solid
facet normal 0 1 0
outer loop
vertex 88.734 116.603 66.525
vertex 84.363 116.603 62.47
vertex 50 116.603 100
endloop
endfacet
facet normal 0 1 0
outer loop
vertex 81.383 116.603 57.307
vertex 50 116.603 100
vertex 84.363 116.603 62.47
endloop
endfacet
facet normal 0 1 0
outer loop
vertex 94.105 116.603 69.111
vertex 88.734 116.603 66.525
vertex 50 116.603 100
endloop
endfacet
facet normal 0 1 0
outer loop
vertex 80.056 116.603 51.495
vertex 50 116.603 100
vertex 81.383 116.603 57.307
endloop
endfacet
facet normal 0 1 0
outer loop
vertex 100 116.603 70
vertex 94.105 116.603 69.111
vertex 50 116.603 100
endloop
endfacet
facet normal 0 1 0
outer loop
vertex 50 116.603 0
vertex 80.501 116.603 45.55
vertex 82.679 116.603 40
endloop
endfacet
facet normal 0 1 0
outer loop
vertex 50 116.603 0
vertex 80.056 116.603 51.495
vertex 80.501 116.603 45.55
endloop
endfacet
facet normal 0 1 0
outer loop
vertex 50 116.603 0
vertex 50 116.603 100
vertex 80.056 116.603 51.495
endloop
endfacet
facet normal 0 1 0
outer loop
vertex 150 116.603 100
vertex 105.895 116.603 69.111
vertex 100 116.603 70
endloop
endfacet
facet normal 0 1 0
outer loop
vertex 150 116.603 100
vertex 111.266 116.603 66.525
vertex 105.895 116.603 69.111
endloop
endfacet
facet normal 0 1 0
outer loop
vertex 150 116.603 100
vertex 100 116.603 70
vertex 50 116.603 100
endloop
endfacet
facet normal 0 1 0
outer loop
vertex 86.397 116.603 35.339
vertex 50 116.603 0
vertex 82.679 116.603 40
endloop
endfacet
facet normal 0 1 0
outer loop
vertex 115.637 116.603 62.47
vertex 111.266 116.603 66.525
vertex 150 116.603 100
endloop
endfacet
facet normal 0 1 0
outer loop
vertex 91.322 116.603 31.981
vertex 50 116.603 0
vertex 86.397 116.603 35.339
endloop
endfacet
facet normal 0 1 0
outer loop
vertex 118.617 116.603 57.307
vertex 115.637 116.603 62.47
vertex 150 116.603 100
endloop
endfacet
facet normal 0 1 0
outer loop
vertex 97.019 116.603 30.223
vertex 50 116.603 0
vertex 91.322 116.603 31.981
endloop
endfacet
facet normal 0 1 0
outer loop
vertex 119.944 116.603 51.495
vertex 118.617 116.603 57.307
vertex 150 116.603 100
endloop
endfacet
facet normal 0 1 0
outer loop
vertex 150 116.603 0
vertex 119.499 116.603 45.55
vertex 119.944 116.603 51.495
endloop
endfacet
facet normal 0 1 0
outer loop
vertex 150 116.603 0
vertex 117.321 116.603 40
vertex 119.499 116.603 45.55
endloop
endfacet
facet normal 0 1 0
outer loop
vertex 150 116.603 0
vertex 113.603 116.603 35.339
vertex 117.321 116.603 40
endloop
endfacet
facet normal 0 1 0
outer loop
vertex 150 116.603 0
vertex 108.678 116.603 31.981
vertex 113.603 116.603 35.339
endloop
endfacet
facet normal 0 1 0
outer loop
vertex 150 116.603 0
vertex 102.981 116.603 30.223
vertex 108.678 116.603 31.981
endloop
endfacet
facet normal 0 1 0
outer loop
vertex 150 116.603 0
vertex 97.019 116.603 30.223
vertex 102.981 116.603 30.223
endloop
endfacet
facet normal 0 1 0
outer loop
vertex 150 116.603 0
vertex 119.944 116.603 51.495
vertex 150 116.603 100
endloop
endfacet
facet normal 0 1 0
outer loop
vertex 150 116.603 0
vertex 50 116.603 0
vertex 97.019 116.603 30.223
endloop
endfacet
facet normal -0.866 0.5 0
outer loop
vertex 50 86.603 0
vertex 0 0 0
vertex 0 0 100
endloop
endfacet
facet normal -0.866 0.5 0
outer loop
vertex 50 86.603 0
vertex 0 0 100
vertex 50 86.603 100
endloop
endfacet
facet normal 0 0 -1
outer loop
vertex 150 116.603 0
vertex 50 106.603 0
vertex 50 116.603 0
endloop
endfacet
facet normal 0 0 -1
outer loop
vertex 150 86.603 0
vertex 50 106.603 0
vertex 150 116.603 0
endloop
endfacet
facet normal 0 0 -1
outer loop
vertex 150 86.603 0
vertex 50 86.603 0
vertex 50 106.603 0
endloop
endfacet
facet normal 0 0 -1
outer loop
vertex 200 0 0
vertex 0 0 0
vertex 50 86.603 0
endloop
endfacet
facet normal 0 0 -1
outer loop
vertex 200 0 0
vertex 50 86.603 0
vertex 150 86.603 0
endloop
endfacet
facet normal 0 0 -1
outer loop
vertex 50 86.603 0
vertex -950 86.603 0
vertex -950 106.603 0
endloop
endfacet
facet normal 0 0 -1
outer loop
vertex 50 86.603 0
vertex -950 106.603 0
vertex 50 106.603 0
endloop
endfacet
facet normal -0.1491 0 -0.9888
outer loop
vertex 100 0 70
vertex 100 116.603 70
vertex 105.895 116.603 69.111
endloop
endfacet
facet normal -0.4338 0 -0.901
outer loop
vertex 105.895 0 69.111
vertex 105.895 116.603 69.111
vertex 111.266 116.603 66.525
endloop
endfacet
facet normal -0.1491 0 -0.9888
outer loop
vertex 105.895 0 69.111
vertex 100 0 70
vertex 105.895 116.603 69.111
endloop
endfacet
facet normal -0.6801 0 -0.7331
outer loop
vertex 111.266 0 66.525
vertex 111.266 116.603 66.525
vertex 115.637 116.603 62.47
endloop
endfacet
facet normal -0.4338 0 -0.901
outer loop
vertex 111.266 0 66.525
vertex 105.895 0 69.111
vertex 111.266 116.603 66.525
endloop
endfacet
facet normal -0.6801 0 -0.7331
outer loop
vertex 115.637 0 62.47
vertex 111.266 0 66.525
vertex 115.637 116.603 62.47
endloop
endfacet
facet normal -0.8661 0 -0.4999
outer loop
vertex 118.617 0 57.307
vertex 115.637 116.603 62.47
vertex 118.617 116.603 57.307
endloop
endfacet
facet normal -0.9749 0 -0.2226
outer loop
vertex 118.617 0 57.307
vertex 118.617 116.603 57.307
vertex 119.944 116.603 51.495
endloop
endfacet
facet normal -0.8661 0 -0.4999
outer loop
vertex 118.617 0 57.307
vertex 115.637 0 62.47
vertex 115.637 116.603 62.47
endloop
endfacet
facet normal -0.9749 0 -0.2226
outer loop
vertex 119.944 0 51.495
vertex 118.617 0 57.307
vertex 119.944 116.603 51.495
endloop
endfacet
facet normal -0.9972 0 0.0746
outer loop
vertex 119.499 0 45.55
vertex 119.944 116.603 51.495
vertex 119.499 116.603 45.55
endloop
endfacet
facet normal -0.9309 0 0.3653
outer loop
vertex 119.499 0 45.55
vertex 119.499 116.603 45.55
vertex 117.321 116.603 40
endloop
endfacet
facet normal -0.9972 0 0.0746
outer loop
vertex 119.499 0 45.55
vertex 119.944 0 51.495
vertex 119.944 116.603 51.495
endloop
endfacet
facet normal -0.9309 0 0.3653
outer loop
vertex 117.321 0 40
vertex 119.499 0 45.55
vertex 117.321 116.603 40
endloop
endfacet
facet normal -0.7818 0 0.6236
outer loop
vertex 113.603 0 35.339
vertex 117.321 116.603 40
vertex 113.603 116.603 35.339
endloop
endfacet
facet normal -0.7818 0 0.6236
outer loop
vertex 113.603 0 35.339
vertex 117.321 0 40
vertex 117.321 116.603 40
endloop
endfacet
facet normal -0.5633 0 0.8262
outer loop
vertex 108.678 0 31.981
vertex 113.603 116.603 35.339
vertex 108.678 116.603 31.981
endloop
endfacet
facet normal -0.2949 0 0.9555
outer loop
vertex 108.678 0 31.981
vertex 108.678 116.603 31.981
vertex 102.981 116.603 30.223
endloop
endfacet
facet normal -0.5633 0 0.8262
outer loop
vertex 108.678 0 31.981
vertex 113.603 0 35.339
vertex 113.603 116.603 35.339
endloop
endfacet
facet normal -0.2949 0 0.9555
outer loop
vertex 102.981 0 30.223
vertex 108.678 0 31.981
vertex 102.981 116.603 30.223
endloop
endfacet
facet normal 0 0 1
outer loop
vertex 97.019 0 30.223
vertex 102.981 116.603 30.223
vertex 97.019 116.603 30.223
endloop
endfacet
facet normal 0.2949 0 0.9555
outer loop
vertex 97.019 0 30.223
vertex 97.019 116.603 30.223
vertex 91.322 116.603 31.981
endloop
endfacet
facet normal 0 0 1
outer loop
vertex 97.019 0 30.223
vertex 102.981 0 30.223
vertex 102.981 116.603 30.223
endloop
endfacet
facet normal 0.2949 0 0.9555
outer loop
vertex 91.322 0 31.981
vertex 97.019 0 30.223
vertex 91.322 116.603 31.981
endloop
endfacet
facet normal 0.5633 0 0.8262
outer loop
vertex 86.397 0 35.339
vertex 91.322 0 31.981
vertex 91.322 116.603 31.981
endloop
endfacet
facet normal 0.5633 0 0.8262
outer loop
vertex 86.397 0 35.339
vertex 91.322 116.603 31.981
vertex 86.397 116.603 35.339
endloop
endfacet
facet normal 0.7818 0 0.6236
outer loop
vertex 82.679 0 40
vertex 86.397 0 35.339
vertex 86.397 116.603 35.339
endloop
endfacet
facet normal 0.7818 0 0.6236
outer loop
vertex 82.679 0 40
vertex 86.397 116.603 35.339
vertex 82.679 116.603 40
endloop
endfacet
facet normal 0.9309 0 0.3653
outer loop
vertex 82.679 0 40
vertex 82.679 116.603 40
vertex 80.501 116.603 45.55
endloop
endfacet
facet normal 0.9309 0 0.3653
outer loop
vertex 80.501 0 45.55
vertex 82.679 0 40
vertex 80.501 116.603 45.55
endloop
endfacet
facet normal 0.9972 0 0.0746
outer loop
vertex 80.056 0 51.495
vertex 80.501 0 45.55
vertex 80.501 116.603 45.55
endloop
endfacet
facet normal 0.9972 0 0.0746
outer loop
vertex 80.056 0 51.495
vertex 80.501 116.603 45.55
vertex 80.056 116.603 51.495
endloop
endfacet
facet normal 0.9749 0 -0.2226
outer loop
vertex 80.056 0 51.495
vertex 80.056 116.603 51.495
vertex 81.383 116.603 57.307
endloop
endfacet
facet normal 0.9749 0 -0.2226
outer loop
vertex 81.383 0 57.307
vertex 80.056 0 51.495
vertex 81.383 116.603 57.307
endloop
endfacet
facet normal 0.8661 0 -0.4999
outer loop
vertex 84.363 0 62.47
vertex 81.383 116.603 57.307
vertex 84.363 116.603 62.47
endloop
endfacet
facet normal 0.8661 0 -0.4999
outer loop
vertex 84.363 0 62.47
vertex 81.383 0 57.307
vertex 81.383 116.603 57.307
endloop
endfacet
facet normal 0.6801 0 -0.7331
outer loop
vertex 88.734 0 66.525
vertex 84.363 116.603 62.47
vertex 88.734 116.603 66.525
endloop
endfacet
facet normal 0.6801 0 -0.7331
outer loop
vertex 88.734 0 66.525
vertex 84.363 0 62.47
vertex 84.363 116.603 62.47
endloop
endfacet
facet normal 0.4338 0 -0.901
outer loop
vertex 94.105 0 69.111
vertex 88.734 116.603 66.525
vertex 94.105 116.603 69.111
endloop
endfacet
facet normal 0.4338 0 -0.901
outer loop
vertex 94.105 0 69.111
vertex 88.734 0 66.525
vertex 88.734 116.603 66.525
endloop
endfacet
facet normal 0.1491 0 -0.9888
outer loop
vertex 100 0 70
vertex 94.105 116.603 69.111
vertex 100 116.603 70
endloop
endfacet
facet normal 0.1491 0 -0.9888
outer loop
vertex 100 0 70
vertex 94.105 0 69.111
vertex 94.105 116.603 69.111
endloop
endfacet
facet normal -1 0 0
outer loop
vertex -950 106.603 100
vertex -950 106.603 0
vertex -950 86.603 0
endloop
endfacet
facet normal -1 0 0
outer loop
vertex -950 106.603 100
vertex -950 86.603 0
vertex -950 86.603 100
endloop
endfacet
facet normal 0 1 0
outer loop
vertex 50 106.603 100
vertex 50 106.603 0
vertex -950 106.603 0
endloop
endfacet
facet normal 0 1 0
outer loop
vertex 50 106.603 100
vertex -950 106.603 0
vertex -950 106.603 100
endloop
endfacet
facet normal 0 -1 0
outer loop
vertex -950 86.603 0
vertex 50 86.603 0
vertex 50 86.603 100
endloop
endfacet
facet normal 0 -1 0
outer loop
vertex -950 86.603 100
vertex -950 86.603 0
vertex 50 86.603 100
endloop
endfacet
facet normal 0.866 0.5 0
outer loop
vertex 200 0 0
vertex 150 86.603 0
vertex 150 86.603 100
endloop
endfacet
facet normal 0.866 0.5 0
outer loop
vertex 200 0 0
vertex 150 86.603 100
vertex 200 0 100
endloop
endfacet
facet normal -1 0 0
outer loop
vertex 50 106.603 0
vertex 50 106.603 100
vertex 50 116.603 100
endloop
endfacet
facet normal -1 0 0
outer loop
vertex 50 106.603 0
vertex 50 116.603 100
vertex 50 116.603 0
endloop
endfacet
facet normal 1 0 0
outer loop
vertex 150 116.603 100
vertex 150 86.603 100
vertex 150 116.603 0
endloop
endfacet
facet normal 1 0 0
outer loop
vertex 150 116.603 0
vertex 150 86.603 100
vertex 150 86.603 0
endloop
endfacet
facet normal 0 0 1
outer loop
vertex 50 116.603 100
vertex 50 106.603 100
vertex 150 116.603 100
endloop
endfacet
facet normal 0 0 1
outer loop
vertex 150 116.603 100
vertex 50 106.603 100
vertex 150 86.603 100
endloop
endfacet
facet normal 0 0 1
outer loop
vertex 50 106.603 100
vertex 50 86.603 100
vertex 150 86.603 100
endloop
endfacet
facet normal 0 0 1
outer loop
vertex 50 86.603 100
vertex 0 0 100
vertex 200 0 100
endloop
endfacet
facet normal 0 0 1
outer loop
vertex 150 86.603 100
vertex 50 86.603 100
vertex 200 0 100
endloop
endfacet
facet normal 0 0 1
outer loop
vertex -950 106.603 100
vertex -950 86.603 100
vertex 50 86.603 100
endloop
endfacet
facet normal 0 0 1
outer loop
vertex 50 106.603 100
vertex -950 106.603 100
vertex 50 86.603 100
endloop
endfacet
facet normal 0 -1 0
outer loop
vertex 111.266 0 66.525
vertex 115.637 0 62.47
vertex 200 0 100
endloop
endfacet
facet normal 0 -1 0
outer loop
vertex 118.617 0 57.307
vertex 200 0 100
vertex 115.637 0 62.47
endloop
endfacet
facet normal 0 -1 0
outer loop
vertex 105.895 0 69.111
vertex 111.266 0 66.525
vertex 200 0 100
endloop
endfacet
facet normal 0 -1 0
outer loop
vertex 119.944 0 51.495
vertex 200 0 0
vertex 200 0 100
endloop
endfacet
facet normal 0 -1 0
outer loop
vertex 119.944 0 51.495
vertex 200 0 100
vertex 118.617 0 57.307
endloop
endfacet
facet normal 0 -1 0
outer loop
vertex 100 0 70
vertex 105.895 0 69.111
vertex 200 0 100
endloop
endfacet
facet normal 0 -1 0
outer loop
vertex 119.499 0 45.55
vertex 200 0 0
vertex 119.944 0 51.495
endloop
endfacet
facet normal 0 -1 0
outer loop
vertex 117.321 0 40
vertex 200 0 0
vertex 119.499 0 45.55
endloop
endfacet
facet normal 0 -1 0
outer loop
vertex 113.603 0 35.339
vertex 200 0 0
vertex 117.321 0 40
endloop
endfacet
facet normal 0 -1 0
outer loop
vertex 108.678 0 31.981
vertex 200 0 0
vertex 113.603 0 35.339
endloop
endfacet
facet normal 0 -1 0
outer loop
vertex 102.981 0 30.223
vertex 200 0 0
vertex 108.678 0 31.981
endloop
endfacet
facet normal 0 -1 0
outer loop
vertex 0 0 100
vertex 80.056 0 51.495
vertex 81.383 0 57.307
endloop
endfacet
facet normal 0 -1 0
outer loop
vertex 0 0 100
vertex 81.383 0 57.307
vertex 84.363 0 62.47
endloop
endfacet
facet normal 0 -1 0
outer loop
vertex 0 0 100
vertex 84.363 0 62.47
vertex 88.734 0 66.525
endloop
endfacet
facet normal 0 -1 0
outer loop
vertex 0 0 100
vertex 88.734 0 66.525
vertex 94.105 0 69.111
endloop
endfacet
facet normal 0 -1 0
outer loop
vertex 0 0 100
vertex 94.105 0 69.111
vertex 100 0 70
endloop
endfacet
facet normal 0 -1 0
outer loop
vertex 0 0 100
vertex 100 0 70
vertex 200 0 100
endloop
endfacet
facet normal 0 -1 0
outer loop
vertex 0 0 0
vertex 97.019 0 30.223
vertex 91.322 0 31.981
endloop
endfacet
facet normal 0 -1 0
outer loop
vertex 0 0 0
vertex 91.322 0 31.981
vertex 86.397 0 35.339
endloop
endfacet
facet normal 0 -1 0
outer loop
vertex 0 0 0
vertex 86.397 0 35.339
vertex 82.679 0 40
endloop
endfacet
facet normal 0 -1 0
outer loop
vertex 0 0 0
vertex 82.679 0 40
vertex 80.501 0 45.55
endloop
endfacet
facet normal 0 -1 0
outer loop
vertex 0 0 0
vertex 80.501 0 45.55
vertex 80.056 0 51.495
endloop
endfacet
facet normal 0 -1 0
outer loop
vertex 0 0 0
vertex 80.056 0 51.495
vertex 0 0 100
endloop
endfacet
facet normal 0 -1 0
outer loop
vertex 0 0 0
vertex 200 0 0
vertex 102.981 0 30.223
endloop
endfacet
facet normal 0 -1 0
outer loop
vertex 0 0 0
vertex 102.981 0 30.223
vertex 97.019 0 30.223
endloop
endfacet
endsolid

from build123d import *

# Parameters (mm, degrees)
SALIENTE_EXTRUIR1_DEPTH = 100
CROQUIS2_W              = 100
CROQUIS2_H              = 100
SALIENTE_EXTRUIR2_DEPTH = 20
CROQUIS3_W              = 100
CROQUIS3_H              = 20
SALIENTE_EXTRUIR3_DEPTH = 1000
CROQUIS4_W              = 100
CROQUIS4_H              = 100
CROQUIS4_R              = 20
SALIENTE_EXTRUIR4_DEPTH = 10
CROQUIS7_R              = 20
CORTAR_EXTRUIR2_DEPTH   = 228.5


with BuildPart() as part:
    # Croquis1 → Saliente-Extruir1 (new body)
    with BuildSketch(Plane.XY):
        Polygon((0, 0), (50, 86.602540378), (150, 86.602540378), (200, 0), align=None)
    extrude(amount=SALIENTE_EXTRUIR1_DEPTH)

    # Croquis2 → Saliente-Extruir2 (add)
    with BuildSketch(Plane(origin=(0, 86.602540378, 0), x_dir=(1, 0, 0), z_dir=(0, 1, 0))):
        with Locations((100, -50)):
            Rectangle(CROQUIS2_W, CROQUIS2_H)
    extrude(amount=SALIENTE_EXTRUIR2_DEPTH)

    # Croquis3 → Saliente-Extruir3 (add)
    with BuildSketch(Plane.ZY.offset(-50)):
        with Locations((50, 96.602540378)):
            Rectangle(CROQUIS3_W, CROQUIS3_H)
    extrude(amount=SALIENTE_EXTRUIR3_DEPTH)

    # Croquis4 → Saliente-Extruir4 (add)
    with BuildSketch(Plane(origin=(0, 106.602540378, 0), x_dir=(1, 0, 0), z_dir=(0, 1, 0))):
        with Locations((100, -50)):
            Rectangle(CROQUIS4_W, CROQUIS4_H)
        with Locations(Location((100, -50, 0), (0, 0, 270))):
            Circle(CROQUIS4_R, mode=Mode.SUBTRACT)
    extrude(amount=SALIENTE_EXTRUIR4_DEPTH)

    # Croquis7 → Cortar-Extruir2 (cut, symmetric)
    with BuildSketch(Plane(origin=(0, 116.602540378, 0), x_dir=(1, 0, 0), z_dir=(0, 1, 0))):
        with Locations(Location((100, -50, 0), (0, 0, 270))):
            Circle(CROQUIS7_R)
    extrude(amount=CORTAR_EXTRUIR2_DEPTH, both=True, mode=Mode.SUBTRACT)


solid = part.part
